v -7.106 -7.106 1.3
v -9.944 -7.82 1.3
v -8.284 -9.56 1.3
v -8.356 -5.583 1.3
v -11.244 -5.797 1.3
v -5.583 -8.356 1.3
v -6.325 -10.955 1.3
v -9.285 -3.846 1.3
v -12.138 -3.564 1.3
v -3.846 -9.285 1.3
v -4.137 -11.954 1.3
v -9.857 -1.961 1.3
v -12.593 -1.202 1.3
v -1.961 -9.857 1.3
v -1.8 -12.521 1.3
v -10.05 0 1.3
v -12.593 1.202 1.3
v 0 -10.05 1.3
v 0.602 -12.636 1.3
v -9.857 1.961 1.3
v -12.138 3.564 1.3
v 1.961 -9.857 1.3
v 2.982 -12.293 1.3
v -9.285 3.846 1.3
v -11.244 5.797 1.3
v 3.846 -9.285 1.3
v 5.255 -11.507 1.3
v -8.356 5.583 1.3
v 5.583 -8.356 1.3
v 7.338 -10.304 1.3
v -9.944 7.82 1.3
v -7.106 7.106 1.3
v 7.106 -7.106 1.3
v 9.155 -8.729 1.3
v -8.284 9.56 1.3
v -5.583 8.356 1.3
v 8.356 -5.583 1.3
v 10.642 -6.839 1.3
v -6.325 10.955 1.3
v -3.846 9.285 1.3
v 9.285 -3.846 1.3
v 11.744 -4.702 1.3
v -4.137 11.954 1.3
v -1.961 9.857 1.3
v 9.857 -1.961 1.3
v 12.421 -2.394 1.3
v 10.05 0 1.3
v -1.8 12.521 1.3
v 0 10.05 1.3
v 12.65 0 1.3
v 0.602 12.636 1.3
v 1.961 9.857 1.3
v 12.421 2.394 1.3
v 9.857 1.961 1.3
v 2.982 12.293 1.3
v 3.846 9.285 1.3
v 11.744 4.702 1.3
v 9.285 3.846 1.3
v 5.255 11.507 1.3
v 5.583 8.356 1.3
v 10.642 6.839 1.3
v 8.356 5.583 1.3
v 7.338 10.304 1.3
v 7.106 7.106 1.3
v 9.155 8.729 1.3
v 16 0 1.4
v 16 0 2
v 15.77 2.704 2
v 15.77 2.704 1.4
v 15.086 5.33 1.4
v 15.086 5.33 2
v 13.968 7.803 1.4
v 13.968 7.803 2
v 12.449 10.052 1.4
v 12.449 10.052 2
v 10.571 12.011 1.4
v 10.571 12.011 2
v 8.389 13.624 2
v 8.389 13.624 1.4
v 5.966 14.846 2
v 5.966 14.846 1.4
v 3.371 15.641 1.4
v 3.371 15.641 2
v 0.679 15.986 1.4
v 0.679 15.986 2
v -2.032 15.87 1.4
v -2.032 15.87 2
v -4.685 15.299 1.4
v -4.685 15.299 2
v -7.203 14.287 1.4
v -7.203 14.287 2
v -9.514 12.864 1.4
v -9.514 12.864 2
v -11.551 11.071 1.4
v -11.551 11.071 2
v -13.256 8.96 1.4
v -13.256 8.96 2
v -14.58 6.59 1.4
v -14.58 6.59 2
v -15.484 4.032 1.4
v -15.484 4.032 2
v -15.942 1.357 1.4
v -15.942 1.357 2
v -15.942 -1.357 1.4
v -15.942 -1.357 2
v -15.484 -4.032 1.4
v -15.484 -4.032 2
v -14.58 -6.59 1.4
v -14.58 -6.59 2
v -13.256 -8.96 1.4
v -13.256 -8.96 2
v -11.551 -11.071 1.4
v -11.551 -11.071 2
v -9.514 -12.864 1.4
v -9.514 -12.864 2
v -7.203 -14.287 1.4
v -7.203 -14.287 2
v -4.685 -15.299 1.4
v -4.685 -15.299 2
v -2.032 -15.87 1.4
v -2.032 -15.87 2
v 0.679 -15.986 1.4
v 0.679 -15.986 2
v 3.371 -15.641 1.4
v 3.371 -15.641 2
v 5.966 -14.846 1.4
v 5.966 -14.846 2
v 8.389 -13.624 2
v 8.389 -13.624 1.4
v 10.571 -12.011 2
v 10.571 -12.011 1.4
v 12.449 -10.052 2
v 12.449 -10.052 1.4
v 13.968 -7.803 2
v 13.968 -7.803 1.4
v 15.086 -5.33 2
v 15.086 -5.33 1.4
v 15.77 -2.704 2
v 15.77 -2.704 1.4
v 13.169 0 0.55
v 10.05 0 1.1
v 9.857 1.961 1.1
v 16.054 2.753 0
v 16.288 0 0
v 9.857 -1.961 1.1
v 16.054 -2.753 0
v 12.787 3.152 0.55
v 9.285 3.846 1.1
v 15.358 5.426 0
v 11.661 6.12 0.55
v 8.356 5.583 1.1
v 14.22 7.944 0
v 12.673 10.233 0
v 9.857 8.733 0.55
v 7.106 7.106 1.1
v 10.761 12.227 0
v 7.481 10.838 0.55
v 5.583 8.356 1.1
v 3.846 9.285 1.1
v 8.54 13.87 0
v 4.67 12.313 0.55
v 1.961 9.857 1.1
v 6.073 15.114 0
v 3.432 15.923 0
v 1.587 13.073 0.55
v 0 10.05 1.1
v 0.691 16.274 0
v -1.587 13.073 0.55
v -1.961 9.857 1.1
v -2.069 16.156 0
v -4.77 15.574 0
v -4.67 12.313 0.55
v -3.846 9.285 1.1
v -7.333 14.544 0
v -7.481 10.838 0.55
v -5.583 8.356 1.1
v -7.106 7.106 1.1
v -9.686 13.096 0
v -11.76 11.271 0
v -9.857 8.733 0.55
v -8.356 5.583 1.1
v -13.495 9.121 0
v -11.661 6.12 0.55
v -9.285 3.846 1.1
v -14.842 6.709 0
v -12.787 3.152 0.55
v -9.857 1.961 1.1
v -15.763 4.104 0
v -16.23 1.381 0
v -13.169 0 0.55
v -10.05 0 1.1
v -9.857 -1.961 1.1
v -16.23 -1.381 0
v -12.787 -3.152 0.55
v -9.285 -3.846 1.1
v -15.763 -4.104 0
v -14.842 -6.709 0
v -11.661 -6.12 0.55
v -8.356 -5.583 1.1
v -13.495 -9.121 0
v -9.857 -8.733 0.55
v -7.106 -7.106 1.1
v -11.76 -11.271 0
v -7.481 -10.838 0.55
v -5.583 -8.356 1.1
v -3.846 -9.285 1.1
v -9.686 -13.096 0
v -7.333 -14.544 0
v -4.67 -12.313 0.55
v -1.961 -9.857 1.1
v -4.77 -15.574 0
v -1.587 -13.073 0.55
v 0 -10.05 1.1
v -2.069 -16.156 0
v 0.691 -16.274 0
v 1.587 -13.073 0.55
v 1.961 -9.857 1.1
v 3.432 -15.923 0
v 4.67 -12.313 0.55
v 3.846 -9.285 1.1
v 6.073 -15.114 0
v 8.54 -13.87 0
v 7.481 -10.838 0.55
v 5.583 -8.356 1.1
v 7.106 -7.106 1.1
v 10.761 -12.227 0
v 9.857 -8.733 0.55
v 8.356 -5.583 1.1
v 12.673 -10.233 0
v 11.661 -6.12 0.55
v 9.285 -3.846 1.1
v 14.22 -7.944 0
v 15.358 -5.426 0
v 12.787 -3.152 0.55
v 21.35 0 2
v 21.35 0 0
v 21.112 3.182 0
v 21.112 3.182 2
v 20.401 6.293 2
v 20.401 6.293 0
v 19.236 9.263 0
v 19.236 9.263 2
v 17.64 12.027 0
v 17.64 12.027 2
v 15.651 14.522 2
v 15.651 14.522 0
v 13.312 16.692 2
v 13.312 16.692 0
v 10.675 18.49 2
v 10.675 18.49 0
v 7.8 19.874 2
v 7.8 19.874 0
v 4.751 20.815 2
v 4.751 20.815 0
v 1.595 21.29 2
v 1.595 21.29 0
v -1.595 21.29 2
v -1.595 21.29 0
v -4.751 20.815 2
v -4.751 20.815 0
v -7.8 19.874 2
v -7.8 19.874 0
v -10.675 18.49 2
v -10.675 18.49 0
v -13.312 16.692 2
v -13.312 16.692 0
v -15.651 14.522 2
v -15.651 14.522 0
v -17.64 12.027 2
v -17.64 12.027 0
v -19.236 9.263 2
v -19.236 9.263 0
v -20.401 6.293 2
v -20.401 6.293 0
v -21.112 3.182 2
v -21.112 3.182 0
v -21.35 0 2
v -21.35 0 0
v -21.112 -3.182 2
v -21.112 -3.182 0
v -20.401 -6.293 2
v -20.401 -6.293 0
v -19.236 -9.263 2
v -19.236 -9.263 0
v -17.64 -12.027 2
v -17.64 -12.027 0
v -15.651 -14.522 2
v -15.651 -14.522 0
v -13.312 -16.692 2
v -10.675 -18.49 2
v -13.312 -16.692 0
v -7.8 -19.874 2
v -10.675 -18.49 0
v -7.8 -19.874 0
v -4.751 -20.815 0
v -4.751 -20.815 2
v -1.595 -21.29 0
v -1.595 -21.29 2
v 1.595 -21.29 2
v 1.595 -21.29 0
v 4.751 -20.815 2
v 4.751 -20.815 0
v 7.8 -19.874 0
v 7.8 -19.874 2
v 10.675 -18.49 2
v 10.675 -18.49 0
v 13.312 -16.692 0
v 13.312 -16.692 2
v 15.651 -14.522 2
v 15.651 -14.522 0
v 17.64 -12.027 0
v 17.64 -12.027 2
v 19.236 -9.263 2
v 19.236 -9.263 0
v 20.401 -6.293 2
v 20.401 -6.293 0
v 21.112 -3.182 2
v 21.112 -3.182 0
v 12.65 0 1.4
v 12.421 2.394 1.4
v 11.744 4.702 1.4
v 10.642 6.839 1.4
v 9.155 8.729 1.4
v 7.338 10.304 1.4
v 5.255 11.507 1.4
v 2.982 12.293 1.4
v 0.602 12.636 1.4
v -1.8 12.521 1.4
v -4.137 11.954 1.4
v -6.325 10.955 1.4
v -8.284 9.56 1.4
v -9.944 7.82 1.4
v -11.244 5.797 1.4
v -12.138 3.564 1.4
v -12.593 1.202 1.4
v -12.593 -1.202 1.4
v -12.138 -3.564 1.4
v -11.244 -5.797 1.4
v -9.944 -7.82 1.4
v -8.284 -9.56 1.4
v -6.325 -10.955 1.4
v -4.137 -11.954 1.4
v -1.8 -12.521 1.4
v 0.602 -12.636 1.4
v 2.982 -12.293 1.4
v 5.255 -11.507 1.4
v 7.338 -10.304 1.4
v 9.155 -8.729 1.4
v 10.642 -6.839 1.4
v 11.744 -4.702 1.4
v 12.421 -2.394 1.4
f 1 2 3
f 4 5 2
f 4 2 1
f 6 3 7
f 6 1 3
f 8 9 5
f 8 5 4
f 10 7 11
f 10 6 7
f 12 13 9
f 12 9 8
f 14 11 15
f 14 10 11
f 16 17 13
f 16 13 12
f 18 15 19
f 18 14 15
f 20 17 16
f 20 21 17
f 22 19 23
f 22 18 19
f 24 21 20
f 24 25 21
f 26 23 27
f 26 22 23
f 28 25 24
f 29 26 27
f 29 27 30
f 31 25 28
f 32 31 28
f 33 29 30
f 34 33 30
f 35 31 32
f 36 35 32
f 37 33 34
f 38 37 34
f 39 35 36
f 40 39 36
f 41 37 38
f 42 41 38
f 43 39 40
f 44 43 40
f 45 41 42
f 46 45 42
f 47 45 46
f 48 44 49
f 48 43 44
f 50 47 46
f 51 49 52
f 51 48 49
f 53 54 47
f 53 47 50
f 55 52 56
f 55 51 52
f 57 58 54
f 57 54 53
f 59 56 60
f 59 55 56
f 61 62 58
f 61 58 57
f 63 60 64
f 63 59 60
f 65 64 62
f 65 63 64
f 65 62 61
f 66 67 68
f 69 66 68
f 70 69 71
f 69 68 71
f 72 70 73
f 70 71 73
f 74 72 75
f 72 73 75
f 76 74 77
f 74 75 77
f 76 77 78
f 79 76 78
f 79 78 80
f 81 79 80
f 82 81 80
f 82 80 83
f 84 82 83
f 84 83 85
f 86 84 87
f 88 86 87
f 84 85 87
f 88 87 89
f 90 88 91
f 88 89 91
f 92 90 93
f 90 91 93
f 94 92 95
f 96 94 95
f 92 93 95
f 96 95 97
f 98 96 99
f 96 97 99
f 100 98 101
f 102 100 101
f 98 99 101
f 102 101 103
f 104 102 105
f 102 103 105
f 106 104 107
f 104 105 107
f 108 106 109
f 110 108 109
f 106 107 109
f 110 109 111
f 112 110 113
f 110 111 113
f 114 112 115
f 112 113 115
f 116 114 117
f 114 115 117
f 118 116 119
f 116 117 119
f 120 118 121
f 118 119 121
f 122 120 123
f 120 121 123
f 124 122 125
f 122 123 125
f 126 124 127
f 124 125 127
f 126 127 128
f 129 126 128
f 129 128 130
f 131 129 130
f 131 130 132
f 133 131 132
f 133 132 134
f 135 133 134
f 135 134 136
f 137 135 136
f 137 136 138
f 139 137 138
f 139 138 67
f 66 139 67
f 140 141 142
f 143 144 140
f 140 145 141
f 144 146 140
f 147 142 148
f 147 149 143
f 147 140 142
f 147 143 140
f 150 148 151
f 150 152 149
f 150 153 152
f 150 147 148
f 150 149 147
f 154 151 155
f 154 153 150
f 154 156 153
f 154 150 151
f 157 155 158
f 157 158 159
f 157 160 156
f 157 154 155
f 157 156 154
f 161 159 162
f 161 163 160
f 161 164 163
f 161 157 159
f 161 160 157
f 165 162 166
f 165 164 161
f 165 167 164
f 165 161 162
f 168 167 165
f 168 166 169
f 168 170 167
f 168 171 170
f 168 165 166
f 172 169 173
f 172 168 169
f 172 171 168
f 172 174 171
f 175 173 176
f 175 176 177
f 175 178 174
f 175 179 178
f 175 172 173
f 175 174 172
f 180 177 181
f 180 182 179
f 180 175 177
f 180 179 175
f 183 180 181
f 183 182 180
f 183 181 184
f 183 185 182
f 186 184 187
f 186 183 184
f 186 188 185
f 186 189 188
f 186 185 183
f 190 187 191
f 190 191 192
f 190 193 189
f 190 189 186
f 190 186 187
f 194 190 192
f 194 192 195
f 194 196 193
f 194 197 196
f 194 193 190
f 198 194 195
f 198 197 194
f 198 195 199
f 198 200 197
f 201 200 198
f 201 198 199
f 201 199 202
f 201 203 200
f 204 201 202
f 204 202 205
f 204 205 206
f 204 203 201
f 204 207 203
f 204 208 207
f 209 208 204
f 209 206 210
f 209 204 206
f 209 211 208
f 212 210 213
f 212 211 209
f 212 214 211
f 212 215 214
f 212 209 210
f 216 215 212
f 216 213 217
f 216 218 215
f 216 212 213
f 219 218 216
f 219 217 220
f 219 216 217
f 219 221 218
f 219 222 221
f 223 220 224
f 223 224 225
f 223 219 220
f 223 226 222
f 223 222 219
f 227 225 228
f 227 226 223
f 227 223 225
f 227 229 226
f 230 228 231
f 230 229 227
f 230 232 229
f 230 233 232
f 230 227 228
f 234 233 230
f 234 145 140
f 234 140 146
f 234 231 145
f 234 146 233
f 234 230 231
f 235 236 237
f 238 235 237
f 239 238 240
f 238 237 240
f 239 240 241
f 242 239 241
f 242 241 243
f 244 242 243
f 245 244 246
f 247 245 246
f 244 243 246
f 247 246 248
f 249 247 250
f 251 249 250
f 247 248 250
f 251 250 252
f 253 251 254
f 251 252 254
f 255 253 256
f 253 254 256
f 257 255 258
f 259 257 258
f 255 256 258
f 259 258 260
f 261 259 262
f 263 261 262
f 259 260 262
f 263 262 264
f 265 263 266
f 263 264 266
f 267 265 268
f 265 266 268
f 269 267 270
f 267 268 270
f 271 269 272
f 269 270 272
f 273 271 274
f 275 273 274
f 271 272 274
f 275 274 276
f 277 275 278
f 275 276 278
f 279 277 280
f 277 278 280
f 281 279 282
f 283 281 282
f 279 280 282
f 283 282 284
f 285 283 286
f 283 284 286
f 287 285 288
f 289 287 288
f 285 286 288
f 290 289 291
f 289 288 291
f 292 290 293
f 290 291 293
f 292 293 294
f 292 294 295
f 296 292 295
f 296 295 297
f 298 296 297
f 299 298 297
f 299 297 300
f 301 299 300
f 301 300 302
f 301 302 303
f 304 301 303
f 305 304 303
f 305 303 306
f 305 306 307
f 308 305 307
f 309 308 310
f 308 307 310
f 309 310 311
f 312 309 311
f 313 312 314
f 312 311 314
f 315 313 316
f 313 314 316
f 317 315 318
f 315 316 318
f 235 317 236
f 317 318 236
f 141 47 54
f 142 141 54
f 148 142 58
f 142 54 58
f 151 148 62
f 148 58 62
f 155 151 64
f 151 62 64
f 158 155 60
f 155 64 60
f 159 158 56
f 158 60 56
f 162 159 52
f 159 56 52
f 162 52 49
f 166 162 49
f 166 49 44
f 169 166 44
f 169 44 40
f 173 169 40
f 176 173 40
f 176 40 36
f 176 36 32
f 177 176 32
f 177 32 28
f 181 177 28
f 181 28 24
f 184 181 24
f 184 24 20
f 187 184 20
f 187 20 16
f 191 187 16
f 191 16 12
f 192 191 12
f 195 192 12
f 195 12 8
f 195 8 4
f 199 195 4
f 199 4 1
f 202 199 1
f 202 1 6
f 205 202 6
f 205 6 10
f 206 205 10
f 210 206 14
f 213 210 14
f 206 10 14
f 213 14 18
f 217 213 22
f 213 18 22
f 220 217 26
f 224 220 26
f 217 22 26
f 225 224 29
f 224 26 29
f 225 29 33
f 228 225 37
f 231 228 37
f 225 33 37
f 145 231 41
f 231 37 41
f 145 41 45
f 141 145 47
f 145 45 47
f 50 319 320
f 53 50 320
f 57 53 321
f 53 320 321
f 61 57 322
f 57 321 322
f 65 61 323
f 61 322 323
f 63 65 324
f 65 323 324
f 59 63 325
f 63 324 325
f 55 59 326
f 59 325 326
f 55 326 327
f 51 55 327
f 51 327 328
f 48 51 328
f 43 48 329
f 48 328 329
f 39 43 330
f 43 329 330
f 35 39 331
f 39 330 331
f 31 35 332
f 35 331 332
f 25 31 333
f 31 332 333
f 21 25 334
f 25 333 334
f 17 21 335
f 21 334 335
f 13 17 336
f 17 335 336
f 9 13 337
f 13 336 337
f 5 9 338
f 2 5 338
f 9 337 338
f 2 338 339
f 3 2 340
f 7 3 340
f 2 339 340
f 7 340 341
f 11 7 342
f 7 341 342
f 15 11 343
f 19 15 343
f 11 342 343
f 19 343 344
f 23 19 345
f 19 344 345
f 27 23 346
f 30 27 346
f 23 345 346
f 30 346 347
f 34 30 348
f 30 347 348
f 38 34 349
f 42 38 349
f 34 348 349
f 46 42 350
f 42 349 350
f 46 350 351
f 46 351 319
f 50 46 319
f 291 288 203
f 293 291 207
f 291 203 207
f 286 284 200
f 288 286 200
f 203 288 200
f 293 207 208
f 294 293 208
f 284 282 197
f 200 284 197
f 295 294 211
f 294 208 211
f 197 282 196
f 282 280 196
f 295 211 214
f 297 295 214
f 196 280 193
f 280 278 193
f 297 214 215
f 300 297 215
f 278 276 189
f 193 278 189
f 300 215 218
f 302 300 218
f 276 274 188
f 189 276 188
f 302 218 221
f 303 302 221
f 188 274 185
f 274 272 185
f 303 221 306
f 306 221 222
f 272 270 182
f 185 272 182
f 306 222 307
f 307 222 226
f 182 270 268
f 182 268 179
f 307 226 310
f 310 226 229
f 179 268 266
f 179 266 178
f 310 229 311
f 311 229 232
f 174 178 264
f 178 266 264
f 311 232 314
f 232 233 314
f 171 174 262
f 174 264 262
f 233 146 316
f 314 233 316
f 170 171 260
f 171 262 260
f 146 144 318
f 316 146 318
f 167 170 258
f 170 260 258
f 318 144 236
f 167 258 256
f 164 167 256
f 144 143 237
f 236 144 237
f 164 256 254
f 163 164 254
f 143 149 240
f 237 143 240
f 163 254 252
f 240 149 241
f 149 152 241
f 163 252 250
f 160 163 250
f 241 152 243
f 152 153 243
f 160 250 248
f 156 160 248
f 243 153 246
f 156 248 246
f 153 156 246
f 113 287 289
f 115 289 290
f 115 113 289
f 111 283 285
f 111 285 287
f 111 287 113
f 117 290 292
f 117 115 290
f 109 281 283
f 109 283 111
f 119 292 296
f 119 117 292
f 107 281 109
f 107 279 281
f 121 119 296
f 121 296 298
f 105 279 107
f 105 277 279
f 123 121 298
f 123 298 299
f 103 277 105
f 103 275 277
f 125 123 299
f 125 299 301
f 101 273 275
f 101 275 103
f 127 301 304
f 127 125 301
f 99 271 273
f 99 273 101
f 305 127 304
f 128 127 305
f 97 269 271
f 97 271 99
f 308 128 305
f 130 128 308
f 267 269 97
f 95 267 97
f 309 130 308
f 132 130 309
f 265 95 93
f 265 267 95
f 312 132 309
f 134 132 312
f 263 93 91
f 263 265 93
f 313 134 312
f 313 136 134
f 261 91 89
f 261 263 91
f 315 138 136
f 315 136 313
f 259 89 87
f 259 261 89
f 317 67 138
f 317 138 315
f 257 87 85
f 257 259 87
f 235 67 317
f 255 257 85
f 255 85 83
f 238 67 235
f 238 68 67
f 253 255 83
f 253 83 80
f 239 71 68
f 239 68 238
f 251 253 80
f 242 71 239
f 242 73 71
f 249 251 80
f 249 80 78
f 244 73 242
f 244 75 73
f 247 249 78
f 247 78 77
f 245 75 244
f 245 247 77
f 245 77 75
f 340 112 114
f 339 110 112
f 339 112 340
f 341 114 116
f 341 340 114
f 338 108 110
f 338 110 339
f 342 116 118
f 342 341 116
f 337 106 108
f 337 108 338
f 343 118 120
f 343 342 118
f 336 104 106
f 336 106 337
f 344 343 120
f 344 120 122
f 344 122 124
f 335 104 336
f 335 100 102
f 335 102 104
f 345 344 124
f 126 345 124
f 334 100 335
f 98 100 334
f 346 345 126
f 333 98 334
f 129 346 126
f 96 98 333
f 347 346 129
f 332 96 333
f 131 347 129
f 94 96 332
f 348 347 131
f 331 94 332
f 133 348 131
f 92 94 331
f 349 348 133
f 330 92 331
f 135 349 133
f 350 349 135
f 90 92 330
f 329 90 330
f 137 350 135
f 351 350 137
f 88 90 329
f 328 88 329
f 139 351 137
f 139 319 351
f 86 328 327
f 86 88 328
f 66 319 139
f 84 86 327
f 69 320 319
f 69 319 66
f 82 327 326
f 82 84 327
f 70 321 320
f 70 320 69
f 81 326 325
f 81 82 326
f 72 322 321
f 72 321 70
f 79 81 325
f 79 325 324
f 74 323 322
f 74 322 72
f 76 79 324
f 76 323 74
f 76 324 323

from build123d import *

# Parameters (mm, degrees)
SKIZZE2_R                       = 21.35
AUFSATZ_LINEAR_AUSTRAGEN1_DEPTH = 2
SKIZZE6_R                       = 10.05
SCHNITT_LINEAR_AUSTRAGEN4_DEPTH = 31.259626567
SKIZZE7_R                       = 16
SCHNITT_LINEAR_AUSTRAGEN5_DEPTH = 0.6
FASE1_SIZE                      = 1.1
FASE1_SIZE2                     = 6.238410002
SKIZZE8_R                       = 12.65
SCHNITT_LINEAR_AUSTRAGEN6_DEPTH = 0.1


with BuildPart() as part:
    # Skizze2 → Aufsatz-Linear austragen1 (new body)
    with BuildSketch(Plane.XY):
        Circle(SKIZZE2_R)
    extrude(amount=AUFSATZ_LINEAR_AUSTRAGEN1_DEPTH)

    # Skizze6 → Schnitt-Linear austragen4 (cut, through all)
    with BuildSketch(Plane.XY.offset(2)):
        Circle(SKIZZE6_R)
    extrude(amount=-SCHNITT_LINEAR_AUSTRAGEN4_DEPTH, mode=Mode.SUBTRACT)

    # Skizze7 → Schnitt-Linear austragen5 (cut)
    with BuildSketch(Plane.XY.offset(2)):
        Circle(SKIZZE7_R)
    extrude(amount=-SCHNITT_LINEAR_AUSTRAGEN5_DEPTH, mode=Mode.SUBTRACT)

    # Fase1
    fase1_edges = [part.edges().sort_by_distance(p)[0] for p in [
        (-10.05, 0, 0),
    ]]
    fase1_side = [part.faces().sort_by_distance(p)[0] for p in [
        (-10.05, 0, 0.7),
    ]]
    chamfer(fase1_edges, length=FASE1_SIZE, length2=FASE1_SIZE2, reference=fase1_side[0])

    # Skizze8 → Schnitt-Linear austragen6 (cut)
    with BuildSketch(Plane.XY.offset(1.4)):
        Circle(SKIZZE8_R)
    extrude(amount=-SCHNITT_LINEAR_AUSTRAGEN6_DEPTH, mode=Mode.SUBTRACT)


solid = part.part
